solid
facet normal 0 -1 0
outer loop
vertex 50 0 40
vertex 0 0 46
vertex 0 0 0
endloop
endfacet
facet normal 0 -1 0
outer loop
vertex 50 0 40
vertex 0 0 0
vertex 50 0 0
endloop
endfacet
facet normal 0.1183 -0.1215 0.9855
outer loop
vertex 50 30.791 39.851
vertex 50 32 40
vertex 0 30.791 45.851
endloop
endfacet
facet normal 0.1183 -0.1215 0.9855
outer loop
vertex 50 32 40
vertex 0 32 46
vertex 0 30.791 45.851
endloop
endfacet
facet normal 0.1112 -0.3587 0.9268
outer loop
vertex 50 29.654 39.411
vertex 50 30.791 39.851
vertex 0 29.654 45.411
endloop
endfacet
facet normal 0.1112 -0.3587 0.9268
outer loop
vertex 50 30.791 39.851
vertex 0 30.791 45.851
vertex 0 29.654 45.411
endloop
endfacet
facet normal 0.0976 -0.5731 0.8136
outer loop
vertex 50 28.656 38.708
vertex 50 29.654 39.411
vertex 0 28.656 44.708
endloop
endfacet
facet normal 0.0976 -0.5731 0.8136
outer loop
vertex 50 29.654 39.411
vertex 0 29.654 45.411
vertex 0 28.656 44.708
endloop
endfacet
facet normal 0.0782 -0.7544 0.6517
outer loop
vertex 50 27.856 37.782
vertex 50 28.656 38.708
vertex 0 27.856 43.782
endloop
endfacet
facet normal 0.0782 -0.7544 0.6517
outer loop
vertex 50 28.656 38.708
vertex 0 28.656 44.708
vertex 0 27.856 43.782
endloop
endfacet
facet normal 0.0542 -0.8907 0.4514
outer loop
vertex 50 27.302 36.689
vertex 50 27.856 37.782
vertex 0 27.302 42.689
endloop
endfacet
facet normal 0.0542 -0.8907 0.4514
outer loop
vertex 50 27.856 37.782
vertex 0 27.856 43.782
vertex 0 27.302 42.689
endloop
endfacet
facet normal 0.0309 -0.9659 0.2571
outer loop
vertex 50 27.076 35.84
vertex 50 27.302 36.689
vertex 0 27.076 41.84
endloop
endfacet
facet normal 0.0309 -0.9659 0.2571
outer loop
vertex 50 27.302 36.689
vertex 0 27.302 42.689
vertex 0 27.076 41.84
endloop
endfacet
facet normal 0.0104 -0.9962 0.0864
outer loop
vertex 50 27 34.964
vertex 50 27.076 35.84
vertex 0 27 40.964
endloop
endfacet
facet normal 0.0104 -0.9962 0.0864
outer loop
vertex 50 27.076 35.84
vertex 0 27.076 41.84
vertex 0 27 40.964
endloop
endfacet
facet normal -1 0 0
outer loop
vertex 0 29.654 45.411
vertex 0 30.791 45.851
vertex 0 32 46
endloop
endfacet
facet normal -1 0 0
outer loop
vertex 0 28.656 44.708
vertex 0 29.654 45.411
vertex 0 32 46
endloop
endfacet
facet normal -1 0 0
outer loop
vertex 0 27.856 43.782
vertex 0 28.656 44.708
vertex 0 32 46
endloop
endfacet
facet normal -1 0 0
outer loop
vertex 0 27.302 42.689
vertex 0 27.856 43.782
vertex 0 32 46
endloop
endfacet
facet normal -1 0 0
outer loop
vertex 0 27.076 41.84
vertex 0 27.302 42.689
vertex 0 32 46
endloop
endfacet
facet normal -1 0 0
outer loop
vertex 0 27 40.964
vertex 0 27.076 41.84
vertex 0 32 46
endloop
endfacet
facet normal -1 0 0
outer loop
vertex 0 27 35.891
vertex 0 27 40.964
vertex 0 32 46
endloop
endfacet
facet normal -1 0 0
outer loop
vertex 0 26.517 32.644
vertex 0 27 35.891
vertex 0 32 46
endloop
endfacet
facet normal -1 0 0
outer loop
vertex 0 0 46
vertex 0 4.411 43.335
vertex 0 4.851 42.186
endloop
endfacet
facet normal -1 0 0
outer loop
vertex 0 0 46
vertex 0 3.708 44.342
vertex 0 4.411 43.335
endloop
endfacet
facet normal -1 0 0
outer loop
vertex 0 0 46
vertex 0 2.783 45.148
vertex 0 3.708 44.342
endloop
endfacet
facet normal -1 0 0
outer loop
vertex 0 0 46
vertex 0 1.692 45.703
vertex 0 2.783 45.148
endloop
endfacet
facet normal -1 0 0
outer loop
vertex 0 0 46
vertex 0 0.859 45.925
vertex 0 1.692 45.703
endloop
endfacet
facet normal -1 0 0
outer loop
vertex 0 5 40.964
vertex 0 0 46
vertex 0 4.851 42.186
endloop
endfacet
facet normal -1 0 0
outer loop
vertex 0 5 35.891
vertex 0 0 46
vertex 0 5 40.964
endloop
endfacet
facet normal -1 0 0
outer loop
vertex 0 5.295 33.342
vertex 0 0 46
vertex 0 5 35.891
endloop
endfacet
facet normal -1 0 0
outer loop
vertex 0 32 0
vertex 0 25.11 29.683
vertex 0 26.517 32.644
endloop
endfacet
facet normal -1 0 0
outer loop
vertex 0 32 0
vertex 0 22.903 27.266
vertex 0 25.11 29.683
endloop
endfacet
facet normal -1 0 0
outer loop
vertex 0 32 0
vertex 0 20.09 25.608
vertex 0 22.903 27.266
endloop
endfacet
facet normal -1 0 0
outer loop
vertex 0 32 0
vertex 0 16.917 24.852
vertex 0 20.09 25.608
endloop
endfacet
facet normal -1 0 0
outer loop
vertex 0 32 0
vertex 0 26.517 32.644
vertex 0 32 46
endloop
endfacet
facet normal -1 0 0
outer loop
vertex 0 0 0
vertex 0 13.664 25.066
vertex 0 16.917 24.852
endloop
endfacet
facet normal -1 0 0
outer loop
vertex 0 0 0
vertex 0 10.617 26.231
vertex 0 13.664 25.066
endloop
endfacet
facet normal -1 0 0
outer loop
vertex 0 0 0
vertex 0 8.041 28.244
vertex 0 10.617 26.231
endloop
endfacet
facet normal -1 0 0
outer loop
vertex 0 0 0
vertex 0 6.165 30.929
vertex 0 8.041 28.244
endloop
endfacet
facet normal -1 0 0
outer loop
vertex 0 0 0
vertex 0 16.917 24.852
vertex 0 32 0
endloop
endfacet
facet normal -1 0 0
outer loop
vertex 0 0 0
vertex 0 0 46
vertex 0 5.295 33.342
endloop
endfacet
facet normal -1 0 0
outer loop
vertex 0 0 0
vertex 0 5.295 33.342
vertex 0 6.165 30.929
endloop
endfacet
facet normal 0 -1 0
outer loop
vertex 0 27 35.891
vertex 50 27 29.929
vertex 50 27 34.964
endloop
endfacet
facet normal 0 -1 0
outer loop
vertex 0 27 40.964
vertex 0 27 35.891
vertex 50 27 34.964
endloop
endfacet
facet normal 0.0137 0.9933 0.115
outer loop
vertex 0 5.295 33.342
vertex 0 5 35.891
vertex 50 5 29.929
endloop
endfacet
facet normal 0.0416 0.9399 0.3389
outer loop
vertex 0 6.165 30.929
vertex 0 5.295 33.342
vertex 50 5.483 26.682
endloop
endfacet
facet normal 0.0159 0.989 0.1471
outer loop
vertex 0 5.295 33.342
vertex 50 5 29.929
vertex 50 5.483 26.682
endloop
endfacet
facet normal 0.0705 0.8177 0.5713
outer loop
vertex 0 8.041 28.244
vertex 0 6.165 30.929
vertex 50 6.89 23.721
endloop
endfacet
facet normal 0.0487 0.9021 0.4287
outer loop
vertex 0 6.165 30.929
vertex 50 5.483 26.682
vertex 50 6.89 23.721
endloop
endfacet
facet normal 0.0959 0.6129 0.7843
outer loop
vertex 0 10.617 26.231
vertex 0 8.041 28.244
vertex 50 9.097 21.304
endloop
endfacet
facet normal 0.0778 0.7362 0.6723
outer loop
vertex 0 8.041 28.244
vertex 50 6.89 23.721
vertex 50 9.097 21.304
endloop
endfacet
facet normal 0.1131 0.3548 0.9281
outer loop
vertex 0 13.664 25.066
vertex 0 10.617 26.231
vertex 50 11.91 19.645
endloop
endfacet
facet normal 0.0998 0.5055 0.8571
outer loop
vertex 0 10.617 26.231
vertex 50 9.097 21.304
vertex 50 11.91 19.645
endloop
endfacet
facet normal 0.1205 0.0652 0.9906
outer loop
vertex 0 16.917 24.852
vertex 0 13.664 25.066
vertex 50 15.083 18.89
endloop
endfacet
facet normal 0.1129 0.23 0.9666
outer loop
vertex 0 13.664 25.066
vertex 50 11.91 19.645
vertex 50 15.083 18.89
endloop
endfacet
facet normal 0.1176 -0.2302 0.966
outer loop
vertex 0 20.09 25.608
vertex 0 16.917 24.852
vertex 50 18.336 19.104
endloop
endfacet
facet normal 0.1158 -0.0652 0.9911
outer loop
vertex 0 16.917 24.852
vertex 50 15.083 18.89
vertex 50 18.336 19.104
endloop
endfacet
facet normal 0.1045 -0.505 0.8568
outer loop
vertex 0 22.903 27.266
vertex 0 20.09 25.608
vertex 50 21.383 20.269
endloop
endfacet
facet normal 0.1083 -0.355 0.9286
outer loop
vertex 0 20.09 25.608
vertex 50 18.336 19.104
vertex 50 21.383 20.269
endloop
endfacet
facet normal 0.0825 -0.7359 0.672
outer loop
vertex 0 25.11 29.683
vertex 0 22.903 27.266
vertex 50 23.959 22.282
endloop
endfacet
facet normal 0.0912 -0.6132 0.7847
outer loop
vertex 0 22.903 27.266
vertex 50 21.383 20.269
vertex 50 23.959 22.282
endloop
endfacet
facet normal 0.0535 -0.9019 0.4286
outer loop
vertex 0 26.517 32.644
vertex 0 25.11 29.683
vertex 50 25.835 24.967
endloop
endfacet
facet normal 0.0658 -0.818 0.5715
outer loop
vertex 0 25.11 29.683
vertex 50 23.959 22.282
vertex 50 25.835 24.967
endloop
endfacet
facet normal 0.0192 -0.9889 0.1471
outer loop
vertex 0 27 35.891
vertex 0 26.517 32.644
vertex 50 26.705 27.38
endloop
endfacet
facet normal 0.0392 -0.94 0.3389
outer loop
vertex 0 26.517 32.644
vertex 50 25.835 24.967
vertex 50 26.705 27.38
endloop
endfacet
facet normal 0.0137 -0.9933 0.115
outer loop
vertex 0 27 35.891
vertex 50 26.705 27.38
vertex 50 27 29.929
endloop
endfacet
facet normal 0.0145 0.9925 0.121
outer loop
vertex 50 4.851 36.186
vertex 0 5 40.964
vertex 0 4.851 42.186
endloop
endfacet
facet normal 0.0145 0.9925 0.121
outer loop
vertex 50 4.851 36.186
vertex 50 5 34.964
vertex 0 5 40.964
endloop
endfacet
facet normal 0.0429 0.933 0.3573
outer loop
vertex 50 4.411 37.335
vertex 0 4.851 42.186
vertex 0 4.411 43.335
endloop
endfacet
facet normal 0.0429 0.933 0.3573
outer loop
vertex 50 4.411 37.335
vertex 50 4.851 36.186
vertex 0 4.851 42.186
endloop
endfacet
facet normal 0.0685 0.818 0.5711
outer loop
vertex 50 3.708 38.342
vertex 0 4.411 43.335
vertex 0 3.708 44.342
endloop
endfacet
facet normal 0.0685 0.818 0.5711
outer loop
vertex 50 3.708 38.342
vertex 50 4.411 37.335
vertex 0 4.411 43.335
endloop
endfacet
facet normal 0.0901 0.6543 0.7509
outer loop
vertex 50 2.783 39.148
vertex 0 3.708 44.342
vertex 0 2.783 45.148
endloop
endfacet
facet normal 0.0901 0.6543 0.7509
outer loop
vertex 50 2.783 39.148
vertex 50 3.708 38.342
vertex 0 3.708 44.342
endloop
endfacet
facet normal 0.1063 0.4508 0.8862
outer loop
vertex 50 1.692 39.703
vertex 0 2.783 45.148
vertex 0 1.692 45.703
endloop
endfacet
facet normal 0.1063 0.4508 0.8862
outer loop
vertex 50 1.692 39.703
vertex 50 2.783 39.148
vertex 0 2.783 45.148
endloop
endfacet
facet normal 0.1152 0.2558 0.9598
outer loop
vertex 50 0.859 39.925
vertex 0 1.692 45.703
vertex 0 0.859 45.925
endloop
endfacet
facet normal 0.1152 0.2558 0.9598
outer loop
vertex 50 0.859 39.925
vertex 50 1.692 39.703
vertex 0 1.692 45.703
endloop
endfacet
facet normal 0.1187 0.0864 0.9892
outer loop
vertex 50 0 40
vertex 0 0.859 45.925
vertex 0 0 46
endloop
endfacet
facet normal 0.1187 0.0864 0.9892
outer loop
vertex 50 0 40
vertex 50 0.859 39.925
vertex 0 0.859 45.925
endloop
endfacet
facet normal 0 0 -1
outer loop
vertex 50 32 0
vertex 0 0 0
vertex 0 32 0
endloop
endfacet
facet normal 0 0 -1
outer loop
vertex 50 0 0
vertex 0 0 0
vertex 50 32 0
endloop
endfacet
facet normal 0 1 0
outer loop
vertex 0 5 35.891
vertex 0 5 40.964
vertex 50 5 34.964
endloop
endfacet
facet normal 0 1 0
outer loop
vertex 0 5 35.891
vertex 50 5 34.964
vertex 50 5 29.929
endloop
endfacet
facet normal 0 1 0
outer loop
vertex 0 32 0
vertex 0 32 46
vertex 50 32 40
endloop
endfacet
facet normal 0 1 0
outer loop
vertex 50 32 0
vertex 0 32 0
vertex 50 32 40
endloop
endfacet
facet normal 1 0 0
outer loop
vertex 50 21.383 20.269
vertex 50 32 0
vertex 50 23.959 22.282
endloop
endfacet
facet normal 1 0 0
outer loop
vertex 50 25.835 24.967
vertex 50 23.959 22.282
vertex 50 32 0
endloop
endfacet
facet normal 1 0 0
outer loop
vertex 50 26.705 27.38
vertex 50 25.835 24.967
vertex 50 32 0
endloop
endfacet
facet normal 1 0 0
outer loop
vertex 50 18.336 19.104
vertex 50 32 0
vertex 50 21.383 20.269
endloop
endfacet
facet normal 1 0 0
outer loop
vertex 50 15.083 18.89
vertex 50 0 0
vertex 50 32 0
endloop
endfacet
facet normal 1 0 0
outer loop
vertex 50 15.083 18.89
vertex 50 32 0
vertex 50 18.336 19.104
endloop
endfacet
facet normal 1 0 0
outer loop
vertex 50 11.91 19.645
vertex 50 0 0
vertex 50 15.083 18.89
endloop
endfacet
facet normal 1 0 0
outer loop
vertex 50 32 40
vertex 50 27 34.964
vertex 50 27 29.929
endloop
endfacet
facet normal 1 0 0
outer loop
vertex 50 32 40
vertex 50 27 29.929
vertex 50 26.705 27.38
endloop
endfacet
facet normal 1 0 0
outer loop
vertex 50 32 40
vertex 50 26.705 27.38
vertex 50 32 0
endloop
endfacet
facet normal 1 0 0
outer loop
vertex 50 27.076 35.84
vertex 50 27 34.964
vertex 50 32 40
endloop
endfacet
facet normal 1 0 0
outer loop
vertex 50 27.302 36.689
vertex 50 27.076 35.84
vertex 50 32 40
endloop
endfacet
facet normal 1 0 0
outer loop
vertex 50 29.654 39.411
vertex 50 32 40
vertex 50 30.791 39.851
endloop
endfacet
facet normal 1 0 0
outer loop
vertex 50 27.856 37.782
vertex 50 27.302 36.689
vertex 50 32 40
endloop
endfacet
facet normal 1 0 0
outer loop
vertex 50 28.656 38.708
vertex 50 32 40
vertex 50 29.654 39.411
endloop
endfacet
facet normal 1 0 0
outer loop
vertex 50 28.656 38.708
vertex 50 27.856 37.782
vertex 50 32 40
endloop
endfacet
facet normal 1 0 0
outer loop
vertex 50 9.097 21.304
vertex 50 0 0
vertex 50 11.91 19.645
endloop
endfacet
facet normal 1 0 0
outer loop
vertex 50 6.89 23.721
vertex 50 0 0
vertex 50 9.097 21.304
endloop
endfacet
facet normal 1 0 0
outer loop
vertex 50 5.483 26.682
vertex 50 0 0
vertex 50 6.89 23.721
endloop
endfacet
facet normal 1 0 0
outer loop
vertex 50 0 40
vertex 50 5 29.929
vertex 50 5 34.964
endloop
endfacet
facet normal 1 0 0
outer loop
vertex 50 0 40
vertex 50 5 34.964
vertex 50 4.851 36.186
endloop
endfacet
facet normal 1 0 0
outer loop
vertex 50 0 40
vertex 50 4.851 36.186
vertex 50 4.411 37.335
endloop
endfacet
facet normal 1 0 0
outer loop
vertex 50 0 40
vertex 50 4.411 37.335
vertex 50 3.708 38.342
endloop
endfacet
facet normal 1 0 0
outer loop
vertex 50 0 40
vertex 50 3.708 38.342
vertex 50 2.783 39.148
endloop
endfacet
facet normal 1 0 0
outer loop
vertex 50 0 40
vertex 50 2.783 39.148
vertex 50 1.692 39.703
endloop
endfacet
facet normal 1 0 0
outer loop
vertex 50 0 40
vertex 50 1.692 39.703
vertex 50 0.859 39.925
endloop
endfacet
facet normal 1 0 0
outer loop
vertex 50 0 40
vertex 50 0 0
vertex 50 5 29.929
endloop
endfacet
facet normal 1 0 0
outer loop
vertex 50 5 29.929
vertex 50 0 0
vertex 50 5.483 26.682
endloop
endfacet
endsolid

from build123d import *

# Parameters (mm, degrees)
F1_DEPTH = 32
F4_DEPTH = 55
F5_R     = 4.99999


# Not quite as in the source:
# - a fillet or chamfer is up to 0.001 mm smaller than in the source, because OpenCascade refuses the exact size


with BuildPart() as f1:
    # F0 (on Front) → F1 (new body)
    with BuildSketch(Plane.XZ):
        Polygon((0, 46), (0, 0), (50, 0), (50, 40), align=None)
    extrude(amount=-F1_DEPTH)

    # F3 (on face) → F4 (cut, symmetric)
    with BuildSketch(Plane(origin=(44.5961827524, 0, -5.3177728391), x_dir=(0, 1, 0), z_dir=(0.9929655081, 0, -0.1184039683))):
        with BuildLine():
            Line((5, 47.6340688765), (5, 35.6388187396))
            ThreePointArc((5, 35.6388187396), (16, 24.6388187396), (27, 35.6388187396))
            Line((27, 35.6388187396), (27, 47.6340688765))
            Line((27, 47.6340688765), (5, 47.6340688765))
        make_face()
    extrude(amount=F4_DEPTH, both=True, mode=Mode.SUBTRACT)

    # F5 (radius 5 in the source; OpenCascade refuses exactly that, so slightly less here)
    f5_edges = [f1.edges().sort_by_distance(p)[0] for p in [
        (25, 27, 43),
        (25, 5, 43),
    ]]
    fillet(f5_edges, radius=F5_R)


solid = f1.part
